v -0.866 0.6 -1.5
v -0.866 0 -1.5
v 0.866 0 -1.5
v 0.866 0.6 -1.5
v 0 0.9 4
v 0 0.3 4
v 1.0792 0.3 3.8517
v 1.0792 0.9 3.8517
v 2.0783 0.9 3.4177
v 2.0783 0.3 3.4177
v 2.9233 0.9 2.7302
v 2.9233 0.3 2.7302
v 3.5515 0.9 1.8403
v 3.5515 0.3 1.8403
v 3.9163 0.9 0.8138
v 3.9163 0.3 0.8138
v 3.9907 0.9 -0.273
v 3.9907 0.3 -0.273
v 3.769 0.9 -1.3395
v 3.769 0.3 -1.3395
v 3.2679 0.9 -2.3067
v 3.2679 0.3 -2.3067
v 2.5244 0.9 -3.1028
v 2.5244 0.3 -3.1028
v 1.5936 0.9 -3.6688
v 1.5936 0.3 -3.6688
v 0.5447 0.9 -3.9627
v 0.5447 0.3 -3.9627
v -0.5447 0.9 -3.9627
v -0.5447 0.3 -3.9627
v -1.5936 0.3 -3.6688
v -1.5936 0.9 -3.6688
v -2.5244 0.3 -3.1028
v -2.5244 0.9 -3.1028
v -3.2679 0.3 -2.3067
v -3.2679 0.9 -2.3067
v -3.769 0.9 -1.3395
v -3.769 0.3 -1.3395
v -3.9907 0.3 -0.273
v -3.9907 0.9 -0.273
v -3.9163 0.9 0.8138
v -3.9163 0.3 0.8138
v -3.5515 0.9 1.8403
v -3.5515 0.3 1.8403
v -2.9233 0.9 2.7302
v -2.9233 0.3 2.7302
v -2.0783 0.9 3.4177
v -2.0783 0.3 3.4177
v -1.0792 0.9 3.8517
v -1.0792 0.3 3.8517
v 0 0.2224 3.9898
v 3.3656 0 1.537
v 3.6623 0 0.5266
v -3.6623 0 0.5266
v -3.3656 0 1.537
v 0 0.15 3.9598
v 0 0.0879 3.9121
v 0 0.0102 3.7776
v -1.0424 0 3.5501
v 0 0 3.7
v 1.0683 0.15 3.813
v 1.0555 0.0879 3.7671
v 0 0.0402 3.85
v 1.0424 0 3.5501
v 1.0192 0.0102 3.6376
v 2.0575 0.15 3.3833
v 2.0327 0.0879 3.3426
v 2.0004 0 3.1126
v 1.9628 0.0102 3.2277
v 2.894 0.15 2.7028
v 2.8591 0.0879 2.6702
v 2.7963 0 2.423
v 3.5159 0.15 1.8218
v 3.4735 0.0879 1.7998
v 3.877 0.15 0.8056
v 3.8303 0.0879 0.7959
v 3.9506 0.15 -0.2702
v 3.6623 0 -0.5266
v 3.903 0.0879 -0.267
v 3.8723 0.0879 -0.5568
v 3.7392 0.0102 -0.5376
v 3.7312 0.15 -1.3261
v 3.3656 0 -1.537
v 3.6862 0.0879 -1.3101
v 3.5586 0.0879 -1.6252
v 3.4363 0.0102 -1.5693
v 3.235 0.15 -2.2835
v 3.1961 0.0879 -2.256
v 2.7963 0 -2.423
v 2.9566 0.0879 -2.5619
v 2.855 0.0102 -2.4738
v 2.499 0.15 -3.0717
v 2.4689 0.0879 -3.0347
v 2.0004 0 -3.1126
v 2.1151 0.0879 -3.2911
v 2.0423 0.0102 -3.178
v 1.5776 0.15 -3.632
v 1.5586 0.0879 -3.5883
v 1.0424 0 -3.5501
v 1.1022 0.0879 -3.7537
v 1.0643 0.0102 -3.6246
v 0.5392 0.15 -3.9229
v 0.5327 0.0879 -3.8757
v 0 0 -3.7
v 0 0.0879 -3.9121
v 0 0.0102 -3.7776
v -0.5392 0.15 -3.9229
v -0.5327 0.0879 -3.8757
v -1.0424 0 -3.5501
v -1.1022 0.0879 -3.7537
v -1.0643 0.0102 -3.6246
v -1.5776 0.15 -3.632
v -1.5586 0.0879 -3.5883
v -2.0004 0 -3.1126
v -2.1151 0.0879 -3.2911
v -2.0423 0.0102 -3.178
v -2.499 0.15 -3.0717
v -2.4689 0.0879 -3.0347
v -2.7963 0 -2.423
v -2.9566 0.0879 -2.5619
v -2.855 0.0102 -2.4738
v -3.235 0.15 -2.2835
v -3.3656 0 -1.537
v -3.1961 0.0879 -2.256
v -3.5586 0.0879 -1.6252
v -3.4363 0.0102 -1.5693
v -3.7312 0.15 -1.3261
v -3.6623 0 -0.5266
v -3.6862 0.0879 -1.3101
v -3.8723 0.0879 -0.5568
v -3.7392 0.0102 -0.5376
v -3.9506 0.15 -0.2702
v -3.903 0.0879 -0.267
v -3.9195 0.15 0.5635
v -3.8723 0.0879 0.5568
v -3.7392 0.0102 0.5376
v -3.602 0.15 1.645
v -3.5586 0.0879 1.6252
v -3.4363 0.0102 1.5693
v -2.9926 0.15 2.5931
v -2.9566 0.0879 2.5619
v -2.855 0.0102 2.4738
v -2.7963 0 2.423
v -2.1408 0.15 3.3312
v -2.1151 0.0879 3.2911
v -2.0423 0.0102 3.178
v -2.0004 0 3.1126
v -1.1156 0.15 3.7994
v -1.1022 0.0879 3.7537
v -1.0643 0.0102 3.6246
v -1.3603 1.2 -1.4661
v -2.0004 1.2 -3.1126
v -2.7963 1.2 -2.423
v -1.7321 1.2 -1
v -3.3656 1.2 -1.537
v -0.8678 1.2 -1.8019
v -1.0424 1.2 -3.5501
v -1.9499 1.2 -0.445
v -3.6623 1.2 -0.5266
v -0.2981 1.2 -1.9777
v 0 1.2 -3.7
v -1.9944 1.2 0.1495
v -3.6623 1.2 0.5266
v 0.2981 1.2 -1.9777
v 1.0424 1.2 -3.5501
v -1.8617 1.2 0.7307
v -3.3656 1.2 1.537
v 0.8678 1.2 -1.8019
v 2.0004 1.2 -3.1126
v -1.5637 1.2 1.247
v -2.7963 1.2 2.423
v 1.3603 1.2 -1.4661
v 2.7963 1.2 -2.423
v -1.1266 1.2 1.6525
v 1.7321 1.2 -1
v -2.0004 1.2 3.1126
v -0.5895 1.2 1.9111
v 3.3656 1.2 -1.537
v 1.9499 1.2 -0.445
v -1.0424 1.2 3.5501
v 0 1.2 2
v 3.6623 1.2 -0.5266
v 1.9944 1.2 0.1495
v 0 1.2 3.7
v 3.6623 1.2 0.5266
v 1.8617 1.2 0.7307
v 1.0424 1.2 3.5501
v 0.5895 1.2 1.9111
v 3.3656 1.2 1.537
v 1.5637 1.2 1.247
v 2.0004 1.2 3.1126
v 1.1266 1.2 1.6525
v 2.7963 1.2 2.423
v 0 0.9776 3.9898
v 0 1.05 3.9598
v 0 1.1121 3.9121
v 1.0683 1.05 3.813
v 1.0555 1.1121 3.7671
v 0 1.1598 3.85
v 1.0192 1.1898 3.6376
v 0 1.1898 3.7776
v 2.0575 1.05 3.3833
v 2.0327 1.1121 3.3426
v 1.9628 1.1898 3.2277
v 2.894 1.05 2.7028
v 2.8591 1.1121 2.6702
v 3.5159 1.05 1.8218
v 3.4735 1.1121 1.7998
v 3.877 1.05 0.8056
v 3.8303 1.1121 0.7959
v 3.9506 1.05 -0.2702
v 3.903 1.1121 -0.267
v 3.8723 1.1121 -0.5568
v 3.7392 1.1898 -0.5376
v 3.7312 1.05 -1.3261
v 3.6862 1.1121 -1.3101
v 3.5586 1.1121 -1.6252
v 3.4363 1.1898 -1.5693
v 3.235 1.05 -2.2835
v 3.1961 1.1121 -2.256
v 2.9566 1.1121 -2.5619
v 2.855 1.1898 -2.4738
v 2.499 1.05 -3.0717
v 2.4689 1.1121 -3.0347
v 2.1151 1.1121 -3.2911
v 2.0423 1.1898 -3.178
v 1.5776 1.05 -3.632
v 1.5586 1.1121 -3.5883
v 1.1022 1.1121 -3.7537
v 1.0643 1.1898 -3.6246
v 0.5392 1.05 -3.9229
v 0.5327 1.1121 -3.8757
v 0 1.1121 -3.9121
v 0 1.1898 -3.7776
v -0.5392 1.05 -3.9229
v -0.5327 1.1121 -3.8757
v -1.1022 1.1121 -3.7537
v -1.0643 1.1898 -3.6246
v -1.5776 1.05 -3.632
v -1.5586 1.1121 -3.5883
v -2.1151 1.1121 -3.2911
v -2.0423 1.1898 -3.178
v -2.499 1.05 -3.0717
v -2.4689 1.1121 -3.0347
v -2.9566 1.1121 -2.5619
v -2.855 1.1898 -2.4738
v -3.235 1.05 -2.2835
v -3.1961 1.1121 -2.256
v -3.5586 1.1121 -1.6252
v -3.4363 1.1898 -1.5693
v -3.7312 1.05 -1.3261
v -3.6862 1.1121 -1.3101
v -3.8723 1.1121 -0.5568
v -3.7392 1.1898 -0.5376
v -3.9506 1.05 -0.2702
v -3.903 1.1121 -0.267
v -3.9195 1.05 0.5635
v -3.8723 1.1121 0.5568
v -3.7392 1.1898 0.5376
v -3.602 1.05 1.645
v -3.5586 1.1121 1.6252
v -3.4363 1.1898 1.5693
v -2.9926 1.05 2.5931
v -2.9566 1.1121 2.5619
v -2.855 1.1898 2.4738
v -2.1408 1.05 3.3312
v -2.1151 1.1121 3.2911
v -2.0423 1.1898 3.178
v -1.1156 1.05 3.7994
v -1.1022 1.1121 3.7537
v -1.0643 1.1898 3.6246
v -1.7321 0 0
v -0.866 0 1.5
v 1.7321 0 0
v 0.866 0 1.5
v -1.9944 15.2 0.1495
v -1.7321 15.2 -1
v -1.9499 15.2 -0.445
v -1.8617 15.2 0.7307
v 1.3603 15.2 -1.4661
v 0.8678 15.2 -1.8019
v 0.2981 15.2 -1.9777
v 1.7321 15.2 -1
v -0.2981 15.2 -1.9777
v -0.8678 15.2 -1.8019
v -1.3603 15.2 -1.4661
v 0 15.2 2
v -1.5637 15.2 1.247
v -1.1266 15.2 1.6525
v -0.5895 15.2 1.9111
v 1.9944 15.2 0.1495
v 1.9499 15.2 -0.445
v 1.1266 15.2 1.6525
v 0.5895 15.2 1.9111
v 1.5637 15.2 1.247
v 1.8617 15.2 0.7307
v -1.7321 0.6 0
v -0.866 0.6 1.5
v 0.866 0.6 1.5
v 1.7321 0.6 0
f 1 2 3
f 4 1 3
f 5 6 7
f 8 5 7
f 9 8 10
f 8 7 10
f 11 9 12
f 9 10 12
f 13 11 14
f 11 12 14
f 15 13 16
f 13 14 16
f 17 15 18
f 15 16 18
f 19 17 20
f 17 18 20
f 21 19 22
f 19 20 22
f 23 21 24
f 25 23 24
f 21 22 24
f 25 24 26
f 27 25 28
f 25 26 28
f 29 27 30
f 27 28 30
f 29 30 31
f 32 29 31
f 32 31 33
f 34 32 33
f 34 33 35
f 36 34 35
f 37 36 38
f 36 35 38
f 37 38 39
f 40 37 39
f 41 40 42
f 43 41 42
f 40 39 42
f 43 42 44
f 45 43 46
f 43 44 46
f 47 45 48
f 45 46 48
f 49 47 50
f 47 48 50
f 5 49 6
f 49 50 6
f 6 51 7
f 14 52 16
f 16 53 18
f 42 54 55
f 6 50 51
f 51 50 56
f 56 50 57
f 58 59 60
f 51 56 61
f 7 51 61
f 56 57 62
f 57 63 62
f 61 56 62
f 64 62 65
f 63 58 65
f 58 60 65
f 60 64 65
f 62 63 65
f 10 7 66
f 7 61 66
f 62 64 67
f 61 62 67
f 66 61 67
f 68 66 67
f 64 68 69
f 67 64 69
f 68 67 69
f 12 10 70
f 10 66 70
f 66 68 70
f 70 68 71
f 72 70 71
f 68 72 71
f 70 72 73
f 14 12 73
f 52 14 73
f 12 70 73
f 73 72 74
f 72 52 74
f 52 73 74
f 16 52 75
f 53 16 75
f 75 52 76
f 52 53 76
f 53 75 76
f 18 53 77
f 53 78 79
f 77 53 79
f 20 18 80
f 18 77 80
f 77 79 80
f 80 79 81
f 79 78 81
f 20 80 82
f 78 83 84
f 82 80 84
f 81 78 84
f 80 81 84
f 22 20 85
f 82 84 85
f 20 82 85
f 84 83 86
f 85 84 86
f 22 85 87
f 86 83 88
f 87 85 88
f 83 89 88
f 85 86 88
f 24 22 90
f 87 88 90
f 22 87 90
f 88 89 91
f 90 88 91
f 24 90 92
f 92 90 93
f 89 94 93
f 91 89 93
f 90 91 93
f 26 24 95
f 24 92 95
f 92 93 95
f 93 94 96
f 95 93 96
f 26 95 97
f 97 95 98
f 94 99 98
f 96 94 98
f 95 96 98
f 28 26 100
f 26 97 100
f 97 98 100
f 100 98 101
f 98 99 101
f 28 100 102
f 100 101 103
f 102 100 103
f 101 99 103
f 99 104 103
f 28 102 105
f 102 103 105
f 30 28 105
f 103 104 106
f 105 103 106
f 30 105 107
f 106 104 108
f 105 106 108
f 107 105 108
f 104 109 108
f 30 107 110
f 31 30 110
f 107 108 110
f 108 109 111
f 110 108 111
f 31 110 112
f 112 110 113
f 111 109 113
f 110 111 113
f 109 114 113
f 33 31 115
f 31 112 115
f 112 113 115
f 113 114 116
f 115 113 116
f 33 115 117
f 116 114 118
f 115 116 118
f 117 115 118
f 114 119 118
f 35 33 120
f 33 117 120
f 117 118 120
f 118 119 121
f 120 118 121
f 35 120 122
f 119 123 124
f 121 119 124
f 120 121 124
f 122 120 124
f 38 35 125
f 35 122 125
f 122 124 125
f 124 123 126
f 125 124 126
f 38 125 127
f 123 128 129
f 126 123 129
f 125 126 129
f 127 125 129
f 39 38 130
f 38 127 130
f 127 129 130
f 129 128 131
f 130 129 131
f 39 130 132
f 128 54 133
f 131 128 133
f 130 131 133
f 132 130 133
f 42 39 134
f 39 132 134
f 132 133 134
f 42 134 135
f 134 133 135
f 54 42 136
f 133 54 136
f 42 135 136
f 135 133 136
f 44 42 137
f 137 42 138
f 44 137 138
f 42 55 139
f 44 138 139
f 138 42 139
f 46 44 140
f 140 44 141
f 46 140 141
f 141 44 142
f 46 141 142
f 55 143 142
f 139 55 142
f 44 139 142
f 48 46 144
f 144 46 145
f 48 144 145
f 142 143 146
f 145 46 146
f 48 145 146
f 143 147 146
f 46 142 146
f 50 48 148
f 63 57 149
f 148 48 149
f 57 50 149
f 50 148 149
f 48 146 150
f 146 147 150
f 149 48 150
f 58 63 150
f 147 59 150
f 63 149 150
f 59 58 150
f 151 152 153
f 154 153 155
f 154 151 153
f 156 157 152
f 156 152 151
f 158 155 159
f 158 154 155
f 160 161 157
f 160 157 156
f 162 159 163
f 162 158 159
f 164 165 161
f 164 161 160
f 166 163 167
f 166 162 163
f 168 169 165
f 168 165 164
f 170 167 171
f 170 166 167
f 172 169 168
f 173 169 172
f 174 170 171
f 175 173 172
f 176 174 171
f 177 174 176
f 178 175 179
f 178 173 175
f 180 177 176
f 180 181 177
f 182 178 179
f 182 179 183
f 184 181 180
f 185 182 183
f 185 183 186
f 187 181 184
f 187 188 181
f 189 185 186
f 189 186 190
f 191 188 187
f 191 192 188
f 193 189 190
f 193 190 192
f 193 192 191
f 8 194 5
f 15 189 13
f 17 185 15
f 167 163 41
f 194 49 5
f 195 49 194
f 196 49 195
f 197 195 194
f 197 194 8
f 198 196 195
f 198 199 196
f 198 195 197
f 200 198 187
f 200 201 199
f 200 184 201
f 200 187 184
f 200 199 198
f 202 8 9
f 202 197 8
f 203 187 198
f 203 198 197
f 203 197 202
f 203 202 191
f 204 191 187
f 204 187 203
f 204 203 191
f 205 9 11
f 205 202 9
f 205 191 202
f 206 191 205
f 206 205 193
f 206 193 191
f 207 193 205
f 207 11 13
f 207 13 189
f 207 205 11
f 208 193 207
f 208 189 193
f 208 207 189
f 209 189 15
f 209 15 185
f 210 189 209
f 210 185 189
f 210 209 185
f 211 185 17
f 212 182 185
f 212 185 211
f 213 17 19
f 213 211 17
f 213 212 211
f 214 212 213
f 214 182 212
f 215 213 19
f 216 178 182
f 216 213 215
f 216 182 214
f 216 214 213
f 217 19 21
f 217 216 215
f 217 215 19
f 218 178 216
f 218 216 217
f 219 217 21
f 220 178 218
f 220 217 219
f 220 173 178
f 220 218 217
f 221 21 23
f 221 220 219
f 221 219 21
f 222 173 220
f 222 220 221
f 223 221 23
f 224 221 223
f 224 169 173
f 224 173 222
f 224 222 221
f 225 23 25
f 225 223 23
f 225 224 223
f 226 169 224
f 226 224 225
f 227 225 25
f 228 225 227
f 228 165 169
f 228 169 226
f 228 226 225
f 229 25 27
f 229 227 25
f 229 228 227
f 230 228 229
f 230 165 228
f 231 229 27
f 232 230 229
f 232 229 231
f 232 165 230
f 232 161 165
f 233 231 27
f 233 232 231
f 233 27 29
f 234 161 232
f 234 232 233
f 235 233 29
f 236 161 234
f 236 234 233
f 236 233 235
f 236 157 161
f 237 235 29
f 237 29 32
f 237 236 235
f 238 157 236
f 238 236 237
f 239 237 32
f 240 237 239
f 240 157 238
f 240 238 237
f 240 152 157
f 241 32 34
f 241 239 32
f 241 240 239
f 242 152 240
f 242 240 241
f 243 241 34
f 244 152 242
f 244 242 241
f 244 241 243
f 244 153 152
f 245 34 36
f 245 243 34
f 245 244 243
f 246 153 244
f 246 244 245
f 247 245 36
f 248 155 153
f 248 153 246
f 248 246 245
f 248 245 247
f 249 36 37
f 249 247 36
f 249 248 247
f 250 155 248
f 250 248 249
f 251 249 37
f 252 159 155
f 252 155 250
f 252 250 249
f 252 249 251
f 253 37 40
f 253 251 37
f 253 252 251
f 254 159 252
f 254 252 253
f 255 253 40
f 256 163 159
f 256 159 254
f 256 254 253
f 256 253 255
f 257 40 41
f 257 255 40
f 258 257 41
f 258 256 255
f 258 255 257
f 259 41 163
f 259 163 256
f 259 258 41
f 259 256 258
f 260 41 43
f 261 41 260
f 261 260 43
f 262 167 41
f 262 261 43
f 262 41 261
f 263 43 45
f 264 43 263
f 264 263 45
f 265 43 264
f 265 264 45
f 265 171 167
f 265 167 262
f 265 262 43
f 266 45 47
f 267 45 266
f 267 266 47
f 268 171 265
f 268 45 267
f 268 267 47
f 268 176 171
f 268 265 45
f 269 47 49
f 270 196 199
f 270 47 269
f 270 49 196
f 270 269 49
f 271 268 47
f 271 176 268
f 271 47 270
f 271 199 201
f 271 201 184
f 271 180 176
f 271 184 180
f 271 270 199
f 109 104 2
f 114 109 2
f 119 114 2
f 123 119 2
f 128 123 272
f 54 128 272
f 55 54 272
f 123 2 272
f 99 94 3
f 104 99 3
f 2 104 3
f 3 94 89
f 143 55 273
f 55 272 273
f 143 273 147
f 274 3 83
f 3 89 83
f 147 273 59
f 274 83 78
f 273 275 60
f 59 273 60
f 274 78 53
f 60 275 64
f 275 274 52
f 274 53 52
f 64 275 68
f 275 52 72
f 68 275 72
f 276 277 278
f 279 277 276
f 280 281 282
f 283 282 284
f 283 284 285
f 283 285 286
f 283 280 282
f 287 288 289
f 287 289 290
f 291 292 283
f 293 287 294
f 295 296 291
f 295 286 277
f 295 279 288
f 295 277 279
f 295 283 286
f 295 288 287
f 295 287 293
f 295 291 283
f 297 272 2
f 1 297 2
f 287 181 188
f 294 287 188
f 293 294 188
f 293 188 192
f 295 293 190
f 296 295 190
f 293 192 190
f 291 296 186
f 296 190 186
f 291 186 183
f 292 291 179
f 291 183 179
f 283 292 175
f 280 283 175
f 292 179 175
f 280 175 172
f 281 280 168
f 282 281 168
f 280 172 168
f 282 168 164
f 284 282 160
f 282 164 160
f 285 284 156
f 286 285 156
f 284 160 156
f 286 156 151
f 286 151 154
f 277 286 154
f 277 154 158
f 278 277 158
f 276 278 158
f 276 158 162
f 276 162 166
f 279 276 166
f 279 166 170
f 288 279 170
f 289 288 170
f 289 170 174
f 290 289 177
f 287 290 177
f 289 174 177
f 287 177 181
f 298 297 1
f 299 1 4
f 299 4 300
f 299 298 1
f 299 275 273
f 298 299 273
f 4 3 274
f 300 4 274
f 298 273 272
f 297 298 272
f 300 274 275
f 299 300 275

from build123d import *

# Parameters (mm, degrees)
SKETCH1_R           = 4
BOSS_EXTRUDE1_DEPTH = 1.2
SKETCH2_R           = 2
BOSS_EXTRUDE2_DEPTH = 14
FILLET2_R           = 0.3
CUT_EXTRUDE1_DEPTH  = 0.6


with BuildPart() as part:
    # Sketch1 → Boss-Extrude1 (new body)
    with BuildSketch(Plane(origin=(0, 0, 0), x_dir=(1, 0, 0), z_dir=(0, 1, 0))):
        with Locations(Location((0, 0, 0), (0, 0, 270))):
            Circle(SKETCH1_R)
    extrude(amount=BOSS_EXTRUDE1_DEPTH)

    # Sketch2 → Boss-Extrude2 (add)
    with BuildSketch(Plane(origin=(0, 1.2, 0), x_dir=(1, 0, 0), z_dir=(0, 1, 0))):
        with Locations(Location((0, 0, 0), (0, 0, 270))):
            Circle(SKETCH2_R)
    extrude(amount=BOSS_EXTRUDE2_DEPTH)

    # Fillet2
    fillet2_edges = [part.edges().sort_by_distance(p)[0] for p in [
        (0, 0, -4),
        (0, 1.2, -4),
    ]]
    fillet(fillet2_edges, radius=FILLET2_R)

    # Sketch3 → Cut-Extrude1 (cut)
    with BuildSketch(Plane.XZ):
        Polygon((1.732050808, 0), (0.866025404, 1.5), (-0.866025404, 1.5), (-1.732050808, 0), (-0.866025404, -1.5), (0.866025404, -1.5), align=None)
    extrude(amount=-CUT_EXTRUDE1_DEPTH, mode=Mode.SUBTRACT)


solid = part.part
